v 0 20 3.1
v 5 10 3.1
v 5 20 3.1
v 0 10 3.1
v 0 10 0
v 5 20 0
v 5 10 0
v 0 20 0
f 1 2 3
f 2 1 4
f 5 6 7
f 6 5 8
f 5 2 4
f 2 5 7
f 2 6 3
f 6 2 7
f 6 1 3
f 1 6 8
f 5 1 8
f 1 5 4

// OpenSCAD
/*cube(size=[10, 10, 4], center=false);
translate([0, 0, 3.1])
cube(size=[10, 20, 3], center=false);*/
/*
translate([0, 10, 0])
cube(size=[10, 10, 3.1], center=false);*/
translate([0, 10, 0])
cube(size=[5, 10, 3.1], center=false);
